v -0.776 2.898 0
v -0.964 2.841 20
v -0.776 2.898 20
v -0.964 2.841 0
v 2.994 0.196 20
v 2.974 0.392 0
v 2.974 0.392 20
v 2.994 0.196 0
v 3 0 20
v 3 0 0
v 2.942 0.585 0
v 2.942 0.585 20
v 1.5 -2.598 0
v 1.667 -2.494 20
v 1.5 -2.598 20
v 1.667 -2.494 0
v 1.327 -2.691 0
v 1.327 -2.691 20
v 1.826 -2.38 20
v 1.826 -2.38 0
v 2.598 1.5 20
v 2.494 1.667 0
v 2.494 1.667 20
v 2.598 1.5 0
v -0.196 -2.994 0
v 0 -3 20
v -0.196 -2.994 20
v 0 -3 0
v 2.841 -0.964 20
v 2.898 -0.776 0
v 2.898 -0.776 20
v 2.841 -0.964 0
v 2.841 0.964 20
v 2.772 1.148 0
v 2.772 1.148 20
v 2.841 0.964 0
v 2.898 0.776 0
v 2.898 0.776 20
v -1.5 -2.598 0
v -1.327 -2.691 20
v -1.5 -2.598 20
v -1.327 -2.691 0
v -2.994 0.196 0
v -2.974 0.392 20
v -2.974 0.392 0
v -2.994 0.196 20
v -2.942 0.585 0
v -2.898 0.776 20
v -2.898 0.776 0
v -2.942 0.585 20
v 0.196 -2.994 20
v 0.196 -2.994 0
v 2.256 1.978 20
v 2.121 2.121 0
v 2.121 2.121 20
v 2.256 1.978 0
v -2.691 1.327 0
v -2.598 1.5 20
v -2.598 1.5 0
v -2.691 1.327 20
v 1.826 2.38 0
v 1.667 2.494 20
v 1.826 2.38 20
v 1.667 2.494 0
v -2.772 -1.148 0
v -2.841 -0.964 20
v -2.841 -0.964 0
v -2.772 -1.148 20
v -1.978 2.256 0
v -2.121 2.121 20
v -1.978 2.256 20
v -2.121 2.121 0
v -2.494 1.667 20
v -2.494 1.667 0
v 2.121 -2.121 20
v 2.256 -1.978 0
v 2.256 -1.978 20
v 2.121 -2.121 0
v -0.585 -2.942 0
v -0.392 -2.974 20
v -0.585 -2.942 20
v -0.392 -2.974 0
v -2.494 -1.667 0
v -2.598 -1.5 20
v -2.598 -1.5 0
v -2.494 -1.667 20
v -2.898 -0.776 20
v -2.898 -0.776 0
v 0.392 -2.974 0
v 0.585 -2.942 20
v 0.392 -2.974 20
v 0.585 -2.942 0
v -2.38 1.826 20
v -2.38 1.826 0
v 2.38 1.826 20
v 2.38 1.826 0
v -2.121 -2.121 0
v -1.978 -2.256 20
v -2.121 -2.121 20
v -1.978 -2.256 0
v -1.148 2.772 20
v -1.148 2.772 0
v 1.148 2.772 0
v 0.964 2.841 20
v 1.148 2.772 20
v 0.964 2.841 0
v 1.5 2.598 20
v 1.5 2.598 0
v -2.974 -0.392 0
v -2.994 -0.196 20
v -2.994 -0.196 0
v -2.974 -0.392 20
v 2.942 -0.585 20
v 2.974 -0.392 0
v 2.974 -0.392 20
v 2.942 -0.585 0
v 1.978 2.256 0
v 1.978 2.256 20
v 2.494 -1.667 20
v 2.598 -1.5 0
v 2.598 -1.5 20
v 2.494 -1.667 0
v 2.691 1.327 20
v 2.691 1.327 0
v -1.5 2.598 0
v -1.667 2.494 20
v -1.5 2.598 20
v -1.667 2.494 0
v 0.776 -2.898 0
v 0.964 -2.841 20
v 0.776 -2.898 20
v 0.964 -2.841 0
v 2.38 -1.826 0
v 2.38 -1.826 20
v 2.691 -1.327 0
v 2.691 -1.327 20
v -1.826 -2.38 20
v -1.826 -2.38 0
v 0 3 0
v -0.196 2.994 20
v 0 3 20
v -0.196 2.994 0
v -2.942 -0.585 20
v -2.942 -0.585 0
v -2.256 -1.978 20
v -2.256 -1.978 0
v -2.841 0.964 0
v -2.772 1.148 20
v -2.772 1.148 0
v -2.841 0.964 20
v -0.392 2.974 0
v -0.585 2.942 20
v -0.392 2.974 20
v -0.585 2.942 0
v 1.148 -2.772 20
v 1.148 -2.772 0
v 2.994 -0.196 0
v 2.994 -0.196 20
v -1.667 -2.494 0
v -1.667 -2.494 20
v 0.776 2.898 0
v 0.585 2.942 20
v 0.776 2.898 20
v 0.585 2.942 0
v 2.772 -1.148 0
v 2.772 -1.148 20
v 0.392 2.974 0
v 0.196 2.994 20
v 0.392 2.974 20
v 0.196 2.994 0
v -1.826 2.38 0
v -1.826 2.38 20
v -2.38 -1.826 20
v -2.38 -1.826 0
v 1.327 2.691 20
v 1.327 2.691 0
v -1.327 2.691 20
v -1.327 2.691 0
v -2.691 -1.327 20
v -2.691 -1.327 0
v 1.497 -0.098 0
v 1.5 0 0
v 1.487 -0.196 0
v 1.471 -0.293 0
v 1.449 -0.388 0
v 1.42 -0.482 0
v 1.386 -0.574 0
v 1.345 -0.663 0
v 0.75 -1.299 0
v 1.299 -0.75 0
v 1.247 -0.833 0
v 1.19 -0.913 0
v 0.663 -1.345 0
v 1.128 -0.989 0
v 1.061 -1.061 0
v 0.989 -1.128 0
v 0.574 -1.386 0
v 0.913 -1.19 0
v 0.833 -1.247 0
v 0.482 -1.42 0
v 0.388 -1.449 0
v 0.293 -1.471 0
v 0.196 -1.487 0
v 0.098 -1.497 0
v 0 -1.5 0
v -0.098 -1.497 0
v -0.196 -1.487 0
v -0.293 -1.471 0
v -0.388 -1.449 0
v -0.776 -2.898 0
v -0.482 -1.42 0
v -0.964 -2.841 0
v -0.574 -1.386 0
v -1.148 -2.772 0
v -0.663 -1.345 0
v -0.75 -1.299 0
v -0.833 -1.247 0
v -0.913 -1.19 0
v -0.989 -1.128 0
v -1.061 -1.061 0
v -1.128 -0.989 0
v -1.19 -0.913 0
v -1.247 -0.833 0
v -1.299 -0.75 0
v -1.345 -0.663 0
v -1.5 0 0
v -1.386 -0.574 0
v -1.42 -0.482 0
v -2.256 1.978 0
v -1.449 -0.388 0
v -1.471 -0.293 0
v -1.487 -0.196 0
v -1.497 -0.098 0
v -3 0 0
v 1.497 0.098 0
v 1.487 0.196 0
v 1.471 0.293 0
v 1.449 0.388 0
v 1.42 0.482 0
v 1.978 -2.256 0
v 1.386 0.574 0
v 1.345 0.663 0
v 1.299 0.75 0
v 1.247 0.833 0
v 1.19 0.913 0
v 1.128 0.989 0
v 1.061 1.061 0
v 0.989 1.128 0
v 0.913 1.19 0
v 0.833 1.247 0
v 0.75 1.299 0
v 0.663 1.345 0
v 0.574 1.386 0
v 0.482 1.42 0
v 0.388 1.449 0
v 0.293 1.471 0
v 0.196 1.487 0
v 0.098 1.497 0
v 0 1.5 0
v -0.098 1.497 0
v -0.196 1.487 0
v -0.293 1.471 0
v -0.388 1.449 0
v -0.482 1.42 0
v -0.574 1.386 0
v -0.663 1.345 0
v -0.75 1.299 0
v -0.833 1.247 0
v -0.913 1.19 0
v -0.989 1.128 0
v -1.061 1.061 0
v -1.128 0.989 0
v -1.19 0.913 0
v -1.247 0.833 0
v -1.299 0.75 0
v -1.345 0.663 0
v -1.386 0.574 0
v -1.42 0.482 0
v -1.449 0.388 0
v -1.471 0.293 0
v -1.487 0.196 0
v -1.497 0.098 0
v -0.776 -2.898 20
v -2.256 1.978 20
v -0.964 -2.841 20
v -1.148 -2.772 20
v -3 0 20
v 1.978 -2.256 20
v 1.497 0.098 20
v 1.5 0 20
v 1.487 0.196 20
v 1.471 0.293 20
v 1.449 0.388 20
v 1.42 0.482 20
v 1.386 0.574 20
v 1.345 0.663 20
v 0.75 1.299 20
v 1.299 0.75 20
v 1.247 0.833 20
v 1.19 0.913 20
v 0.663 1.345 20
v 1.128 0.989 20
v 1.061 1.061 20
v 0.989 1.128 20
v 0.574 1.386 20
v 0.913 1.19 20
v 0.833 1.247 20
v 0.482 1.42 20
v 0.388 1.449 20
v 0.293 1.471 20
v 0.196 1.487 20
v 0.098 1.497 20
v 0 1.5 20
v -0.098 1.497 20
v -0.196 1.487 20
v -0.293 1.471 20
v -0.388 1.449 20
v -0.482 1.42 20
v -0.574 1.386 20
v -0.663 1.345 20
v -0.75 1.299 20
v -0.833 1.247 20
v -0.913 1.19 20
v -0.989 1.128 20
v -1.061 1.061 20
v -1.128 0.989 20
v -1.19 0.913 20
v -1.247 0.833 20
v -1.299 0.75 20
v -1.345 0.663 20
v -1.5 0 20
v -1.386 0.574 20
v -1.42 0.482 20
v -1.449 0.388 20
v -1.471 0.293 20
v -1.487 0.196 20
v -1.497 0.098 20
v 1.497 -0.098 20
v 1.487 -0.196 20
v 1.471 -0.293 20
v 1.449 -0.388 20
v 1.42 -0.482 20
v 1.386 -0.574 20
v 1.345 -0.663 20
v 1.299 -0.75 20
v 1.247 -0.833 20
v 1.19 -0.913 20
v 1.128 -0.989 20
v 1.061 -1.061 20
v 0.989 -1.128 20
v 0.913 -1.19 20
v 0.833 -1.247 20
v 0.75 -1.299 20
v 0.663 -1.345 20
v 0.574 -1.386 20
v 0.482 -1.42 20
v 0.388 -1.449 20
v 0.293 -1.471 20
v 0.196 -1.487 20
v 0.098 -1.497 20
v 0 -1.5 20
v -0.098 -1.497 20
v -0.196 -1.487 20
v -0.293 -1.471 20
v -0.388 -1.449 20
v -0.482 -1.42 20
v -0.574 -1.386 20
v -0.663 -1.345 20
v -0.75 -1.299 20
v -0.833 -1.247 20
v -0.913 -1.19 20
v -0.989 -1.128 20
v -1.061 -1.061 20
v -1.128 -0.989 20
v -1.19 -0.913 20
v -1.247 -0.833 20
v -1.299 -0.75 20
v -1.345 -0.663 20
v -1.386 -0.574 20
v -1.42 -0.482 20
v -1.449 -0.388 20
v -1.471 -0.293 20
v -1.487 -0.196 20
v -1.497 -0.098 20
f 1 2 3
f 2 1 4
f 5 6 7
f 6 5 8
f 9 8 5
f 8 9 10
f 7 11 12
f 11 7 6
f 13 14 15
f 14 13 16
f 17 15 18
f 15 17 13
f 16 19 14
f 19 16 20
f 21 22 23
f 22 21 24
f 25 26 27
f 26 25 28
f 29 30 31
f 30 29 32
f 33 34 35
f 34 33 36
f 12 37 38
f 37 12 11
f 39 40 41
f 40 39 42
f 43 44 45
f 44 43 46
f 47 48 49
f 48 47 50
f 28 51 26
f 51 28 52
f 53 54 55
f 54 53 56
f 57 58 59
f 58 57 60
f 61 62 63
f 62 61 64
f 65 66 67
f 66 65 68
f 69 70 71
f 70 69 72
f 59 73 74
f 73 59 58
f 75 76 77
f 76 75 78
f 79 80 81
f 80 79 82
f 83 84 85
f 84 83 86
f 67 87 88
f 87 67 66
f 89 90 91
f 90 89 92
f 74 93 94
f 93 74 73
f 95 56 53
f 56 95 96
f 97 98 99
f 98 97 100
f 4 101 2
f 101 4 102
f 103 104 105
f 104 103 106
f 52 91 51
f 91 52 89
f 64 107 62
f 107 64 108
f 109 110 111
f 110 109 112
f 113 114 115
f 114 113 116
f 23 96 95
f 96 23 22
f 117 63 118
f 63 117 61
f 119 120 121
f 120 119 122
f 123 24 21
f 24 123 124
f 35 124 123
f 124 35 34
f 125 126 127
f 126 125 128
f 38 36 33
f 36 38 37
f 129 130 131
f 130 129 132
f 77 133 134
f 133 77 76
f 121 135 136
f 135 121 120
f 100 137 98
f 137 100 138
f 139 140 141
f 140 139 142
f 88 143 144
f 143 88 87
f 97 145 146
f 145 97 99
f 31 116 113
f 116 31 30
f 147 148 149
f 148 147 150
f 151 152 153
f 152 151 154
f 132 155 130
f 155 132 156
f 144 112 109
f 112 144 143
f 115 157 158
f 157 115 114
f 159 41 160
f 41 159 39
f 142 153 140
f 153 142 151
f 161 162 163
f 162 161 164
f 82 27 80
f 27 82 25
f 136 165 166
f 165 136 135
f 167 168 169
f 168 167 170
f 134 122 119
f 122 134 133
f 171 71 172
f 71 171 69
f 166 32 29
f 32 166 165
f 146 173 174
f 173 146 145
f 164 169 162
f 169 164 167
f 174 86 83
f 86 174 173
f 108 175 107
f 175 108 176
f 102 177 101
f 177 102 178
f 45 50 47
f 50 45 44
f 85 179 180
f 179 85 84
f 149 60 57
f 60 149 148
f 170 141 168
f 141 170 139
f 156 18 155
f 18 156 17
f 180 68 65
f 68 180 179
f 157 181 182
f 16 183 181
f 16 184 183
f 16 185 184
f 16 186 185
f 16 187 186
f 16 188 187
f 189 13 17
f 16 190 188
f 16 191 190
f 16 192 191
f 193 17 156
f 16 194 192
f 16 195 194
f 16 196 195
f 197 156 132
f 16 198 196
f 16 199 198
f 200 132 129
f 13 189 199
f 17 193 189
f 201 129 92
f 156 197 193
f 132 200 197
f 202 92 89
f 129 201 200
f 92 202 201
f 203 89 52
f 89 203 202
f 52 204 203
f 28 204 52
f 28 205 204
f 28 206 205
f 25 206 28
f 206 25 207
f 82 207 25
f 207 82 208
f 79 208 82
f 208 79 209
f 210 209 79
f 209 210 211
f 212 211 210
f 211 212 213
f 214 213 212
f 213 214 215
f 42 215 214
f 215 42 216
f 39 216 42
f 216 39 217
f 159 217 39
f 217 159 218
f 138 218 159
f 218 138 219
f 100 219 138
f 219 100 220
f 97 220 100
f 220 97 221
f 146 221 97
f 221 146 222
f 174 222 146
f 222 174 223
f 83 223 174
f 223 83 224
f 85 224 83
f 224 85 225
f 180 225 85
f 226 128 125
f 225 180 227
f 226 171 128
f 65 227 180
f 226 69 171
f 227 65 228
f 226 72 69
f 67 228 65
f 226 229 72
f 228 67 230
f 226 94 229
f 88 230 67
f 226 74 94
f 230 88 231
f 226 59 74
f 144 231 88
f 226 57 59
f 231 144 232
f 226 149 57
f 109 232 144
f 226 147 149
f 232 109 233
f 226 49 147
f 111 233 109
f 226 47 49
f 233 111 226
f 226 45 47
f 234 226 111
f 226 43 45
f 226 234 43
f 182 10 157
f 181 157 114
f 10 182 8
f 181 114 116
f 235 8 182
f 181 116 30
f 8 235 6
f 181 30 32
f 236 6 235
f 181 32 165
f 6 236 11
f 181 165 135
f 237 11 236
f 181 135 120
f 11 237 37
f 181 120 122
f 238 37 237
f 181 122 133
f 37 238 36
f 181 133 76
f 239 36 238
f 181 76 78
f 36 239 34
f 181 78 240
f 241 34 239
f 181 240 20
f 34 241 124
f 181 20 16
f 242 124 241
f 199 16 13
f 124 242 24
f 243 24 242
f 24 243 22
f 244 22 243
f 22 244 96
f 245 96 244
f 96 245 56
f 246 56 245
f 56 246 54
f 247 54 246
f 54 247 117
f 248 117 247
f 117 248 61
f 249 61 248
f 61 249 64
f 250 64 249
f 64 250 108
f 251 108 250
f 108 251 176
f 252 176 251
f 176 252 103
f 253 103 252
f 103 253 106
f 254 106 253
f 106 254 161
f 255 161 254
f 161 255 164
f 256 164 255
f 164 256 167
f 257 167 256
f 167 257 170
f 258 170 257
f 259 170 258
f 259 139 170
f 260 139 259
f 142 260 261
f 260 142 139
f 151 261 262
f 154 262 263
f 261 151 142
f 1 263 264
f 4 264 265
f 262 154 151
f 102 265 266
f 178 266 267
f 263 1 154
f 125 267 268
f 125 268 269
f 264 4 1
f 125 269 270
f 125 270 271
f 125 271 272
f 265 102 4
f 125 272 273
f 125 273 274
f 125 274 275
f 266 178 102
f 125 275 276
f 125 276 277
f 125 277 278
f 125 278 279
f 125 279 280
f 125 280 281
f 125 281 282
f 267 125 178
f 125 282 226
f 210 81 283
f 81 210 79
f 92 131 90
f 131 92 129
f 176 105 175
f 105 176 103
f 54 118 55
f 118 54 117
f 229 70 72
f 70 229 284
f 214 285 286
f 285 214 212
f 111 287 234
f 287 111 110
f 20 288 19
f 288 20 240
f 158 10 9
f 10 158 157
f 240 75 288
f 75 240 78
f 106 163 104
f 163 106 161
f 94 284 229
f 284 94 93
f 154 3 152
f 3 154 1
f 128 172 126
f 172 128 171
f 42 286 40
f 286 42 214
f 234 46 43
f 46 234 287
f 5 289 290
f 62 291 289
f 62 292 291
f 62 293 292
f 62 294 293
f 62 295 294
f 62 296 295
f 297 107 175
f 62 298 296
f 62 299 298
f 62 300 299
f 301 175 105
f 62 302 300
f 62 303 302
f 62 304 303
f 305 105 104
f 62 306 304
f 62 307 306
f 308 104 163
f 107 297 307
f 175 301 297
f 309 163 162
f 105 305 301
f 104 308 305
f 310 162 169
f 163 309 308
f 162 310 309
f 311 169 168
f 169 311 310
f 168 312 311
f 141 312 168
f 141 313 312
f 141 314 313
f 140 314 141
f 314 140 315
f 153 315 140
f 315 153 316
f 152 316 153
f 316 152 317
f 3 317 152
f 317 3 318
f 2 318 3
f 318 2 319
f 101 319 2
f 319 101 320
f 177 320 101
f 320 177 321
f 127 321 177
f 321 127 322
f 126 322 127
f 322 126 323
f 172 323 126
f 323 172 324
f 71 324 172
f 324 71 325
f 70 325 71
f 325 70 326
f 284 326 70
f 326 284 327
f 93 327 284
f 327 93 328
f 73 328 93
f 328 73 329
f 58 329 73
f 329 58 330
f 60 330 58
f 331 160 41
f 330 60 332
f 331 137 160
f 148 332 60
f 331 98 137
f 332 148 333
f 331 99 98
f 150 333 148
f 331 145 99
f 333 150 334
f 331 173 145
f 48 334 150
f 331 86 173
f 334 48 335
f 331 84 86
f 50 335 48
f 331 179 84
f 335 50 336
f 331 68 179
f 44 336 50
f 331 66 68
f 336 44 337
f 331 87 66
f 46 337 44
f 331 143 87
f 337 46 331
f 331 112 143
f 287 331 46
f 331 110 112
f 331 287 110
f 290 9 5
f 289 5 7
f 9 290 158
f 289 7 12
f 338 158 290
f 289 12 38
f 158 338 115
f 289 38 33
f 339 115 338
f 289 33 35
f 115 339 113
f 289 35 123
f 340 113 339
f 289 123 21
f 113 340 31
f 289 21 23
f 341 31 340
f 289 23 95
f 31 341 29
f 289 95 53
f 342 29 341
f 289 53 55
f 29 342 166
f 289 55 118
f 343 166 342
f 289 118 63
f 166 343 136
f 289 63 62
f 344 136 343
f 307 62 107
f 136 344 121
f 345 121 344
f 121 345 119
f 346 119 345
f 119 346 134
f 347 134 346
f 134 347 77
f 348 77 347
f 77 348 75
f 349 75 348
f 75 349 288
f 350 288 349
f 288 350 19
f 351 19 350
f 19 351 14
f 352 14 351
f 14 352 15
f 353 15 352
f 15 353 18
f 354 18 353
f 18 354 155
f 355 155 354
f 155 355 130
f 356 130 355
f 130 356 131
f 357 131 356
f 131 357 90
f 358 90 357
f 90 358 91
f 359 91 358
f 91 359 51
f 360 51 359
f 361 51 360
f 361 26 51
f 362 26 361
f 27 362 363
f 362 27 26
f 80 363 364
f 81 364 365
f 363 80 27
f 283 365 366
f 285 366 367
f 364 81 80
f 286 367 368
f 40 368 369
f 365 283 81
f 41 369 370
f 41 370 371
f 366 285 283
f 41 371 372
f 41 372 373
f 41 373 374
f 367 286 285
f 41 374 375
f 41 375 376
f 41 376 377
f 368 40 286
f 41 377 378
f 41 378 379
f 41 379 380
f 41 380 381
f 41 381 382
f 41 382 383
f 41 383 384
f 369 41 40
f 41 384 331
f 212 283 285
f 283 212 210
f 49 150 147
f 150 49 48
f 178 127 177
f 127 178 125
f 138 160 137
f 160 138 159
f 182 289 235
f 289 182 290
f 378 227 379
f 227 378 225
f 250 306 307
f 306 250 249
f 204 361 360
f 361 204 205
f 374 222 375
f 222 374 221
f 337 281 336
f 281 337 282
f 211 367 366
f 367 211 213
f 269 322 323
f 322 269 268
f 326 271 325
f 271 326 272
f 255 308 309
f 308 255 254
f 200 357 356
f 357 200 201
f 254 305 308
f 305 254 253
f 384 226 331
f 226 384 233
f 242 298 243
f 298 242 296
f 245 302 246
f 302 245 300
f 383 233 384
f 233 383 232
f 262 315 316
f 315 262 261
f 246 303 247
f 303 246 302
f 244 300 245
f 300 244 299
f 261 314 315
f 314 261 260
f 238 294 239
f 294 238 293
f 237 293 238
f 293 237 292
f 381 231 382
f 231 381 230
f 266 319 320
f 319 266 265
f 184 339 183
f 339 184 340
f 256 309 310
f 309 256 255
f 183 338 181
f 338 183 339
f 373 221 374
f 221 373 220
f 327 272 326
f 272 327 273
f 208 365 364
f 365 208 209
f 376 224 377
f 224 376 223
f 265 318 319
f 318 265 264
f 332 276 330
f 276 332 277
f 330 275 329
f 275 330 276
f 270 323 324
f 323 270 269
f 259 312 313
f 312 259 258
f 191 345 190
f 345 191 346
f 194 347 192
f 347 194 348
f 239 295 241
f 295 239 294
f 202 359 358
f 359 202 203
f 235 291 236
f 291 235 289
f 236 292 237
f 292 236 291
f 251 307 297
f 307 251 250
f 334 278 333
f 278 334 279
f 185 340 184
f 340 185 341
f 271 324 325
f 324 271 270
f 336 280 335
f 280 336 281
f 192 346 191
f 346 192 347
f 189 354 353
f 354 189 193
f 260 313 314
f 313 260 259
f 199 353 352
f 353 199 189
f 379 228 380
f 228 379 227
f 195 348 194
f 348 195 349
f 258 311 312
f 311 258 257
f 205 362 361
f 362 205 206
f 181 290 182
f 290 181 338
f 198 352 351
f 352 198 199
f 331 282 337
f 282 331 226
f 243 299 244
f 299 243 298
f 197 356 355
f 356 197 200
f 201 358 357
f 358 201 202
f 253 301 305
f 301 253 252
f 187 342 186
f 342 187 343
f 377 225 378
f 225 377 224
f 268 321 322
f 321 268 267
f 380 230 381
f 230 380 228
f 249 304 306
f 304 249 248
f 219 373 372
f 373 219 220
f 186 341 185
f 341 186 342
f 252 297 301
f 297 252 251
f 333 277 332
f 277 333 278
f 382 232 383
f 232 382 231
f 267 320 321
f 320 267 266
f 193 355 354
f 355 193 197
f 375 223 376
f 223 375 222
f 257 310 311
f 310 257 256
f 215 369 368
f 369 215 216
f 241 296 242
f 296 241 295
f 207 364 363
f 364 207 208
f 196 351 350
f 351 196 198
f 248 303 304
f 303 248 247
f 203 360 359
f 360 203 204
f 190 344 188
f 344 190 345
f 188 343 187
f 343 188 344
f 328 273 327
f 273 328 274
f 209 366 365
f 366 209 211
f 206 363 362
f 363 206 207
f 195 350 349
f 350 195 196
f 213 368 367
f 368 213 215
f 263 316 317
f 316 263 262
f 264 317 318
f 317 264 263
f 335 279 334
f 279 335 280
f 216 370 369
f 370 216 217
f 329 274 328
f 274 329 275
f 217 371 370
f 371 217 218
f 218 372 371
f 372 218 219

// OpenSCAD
$fn = 96;

thread_d = 3.0;      // mm (nominal)
length = 20.0;       // mm
outer_d = 6.0;       // mm (fallback since diameter was "None")

difference() {
  cylinder(d = outer_d, h = length);
  translate([0, 0, -0.2])
    cylinder(d = thread_d, h = length + 0.4);
}
